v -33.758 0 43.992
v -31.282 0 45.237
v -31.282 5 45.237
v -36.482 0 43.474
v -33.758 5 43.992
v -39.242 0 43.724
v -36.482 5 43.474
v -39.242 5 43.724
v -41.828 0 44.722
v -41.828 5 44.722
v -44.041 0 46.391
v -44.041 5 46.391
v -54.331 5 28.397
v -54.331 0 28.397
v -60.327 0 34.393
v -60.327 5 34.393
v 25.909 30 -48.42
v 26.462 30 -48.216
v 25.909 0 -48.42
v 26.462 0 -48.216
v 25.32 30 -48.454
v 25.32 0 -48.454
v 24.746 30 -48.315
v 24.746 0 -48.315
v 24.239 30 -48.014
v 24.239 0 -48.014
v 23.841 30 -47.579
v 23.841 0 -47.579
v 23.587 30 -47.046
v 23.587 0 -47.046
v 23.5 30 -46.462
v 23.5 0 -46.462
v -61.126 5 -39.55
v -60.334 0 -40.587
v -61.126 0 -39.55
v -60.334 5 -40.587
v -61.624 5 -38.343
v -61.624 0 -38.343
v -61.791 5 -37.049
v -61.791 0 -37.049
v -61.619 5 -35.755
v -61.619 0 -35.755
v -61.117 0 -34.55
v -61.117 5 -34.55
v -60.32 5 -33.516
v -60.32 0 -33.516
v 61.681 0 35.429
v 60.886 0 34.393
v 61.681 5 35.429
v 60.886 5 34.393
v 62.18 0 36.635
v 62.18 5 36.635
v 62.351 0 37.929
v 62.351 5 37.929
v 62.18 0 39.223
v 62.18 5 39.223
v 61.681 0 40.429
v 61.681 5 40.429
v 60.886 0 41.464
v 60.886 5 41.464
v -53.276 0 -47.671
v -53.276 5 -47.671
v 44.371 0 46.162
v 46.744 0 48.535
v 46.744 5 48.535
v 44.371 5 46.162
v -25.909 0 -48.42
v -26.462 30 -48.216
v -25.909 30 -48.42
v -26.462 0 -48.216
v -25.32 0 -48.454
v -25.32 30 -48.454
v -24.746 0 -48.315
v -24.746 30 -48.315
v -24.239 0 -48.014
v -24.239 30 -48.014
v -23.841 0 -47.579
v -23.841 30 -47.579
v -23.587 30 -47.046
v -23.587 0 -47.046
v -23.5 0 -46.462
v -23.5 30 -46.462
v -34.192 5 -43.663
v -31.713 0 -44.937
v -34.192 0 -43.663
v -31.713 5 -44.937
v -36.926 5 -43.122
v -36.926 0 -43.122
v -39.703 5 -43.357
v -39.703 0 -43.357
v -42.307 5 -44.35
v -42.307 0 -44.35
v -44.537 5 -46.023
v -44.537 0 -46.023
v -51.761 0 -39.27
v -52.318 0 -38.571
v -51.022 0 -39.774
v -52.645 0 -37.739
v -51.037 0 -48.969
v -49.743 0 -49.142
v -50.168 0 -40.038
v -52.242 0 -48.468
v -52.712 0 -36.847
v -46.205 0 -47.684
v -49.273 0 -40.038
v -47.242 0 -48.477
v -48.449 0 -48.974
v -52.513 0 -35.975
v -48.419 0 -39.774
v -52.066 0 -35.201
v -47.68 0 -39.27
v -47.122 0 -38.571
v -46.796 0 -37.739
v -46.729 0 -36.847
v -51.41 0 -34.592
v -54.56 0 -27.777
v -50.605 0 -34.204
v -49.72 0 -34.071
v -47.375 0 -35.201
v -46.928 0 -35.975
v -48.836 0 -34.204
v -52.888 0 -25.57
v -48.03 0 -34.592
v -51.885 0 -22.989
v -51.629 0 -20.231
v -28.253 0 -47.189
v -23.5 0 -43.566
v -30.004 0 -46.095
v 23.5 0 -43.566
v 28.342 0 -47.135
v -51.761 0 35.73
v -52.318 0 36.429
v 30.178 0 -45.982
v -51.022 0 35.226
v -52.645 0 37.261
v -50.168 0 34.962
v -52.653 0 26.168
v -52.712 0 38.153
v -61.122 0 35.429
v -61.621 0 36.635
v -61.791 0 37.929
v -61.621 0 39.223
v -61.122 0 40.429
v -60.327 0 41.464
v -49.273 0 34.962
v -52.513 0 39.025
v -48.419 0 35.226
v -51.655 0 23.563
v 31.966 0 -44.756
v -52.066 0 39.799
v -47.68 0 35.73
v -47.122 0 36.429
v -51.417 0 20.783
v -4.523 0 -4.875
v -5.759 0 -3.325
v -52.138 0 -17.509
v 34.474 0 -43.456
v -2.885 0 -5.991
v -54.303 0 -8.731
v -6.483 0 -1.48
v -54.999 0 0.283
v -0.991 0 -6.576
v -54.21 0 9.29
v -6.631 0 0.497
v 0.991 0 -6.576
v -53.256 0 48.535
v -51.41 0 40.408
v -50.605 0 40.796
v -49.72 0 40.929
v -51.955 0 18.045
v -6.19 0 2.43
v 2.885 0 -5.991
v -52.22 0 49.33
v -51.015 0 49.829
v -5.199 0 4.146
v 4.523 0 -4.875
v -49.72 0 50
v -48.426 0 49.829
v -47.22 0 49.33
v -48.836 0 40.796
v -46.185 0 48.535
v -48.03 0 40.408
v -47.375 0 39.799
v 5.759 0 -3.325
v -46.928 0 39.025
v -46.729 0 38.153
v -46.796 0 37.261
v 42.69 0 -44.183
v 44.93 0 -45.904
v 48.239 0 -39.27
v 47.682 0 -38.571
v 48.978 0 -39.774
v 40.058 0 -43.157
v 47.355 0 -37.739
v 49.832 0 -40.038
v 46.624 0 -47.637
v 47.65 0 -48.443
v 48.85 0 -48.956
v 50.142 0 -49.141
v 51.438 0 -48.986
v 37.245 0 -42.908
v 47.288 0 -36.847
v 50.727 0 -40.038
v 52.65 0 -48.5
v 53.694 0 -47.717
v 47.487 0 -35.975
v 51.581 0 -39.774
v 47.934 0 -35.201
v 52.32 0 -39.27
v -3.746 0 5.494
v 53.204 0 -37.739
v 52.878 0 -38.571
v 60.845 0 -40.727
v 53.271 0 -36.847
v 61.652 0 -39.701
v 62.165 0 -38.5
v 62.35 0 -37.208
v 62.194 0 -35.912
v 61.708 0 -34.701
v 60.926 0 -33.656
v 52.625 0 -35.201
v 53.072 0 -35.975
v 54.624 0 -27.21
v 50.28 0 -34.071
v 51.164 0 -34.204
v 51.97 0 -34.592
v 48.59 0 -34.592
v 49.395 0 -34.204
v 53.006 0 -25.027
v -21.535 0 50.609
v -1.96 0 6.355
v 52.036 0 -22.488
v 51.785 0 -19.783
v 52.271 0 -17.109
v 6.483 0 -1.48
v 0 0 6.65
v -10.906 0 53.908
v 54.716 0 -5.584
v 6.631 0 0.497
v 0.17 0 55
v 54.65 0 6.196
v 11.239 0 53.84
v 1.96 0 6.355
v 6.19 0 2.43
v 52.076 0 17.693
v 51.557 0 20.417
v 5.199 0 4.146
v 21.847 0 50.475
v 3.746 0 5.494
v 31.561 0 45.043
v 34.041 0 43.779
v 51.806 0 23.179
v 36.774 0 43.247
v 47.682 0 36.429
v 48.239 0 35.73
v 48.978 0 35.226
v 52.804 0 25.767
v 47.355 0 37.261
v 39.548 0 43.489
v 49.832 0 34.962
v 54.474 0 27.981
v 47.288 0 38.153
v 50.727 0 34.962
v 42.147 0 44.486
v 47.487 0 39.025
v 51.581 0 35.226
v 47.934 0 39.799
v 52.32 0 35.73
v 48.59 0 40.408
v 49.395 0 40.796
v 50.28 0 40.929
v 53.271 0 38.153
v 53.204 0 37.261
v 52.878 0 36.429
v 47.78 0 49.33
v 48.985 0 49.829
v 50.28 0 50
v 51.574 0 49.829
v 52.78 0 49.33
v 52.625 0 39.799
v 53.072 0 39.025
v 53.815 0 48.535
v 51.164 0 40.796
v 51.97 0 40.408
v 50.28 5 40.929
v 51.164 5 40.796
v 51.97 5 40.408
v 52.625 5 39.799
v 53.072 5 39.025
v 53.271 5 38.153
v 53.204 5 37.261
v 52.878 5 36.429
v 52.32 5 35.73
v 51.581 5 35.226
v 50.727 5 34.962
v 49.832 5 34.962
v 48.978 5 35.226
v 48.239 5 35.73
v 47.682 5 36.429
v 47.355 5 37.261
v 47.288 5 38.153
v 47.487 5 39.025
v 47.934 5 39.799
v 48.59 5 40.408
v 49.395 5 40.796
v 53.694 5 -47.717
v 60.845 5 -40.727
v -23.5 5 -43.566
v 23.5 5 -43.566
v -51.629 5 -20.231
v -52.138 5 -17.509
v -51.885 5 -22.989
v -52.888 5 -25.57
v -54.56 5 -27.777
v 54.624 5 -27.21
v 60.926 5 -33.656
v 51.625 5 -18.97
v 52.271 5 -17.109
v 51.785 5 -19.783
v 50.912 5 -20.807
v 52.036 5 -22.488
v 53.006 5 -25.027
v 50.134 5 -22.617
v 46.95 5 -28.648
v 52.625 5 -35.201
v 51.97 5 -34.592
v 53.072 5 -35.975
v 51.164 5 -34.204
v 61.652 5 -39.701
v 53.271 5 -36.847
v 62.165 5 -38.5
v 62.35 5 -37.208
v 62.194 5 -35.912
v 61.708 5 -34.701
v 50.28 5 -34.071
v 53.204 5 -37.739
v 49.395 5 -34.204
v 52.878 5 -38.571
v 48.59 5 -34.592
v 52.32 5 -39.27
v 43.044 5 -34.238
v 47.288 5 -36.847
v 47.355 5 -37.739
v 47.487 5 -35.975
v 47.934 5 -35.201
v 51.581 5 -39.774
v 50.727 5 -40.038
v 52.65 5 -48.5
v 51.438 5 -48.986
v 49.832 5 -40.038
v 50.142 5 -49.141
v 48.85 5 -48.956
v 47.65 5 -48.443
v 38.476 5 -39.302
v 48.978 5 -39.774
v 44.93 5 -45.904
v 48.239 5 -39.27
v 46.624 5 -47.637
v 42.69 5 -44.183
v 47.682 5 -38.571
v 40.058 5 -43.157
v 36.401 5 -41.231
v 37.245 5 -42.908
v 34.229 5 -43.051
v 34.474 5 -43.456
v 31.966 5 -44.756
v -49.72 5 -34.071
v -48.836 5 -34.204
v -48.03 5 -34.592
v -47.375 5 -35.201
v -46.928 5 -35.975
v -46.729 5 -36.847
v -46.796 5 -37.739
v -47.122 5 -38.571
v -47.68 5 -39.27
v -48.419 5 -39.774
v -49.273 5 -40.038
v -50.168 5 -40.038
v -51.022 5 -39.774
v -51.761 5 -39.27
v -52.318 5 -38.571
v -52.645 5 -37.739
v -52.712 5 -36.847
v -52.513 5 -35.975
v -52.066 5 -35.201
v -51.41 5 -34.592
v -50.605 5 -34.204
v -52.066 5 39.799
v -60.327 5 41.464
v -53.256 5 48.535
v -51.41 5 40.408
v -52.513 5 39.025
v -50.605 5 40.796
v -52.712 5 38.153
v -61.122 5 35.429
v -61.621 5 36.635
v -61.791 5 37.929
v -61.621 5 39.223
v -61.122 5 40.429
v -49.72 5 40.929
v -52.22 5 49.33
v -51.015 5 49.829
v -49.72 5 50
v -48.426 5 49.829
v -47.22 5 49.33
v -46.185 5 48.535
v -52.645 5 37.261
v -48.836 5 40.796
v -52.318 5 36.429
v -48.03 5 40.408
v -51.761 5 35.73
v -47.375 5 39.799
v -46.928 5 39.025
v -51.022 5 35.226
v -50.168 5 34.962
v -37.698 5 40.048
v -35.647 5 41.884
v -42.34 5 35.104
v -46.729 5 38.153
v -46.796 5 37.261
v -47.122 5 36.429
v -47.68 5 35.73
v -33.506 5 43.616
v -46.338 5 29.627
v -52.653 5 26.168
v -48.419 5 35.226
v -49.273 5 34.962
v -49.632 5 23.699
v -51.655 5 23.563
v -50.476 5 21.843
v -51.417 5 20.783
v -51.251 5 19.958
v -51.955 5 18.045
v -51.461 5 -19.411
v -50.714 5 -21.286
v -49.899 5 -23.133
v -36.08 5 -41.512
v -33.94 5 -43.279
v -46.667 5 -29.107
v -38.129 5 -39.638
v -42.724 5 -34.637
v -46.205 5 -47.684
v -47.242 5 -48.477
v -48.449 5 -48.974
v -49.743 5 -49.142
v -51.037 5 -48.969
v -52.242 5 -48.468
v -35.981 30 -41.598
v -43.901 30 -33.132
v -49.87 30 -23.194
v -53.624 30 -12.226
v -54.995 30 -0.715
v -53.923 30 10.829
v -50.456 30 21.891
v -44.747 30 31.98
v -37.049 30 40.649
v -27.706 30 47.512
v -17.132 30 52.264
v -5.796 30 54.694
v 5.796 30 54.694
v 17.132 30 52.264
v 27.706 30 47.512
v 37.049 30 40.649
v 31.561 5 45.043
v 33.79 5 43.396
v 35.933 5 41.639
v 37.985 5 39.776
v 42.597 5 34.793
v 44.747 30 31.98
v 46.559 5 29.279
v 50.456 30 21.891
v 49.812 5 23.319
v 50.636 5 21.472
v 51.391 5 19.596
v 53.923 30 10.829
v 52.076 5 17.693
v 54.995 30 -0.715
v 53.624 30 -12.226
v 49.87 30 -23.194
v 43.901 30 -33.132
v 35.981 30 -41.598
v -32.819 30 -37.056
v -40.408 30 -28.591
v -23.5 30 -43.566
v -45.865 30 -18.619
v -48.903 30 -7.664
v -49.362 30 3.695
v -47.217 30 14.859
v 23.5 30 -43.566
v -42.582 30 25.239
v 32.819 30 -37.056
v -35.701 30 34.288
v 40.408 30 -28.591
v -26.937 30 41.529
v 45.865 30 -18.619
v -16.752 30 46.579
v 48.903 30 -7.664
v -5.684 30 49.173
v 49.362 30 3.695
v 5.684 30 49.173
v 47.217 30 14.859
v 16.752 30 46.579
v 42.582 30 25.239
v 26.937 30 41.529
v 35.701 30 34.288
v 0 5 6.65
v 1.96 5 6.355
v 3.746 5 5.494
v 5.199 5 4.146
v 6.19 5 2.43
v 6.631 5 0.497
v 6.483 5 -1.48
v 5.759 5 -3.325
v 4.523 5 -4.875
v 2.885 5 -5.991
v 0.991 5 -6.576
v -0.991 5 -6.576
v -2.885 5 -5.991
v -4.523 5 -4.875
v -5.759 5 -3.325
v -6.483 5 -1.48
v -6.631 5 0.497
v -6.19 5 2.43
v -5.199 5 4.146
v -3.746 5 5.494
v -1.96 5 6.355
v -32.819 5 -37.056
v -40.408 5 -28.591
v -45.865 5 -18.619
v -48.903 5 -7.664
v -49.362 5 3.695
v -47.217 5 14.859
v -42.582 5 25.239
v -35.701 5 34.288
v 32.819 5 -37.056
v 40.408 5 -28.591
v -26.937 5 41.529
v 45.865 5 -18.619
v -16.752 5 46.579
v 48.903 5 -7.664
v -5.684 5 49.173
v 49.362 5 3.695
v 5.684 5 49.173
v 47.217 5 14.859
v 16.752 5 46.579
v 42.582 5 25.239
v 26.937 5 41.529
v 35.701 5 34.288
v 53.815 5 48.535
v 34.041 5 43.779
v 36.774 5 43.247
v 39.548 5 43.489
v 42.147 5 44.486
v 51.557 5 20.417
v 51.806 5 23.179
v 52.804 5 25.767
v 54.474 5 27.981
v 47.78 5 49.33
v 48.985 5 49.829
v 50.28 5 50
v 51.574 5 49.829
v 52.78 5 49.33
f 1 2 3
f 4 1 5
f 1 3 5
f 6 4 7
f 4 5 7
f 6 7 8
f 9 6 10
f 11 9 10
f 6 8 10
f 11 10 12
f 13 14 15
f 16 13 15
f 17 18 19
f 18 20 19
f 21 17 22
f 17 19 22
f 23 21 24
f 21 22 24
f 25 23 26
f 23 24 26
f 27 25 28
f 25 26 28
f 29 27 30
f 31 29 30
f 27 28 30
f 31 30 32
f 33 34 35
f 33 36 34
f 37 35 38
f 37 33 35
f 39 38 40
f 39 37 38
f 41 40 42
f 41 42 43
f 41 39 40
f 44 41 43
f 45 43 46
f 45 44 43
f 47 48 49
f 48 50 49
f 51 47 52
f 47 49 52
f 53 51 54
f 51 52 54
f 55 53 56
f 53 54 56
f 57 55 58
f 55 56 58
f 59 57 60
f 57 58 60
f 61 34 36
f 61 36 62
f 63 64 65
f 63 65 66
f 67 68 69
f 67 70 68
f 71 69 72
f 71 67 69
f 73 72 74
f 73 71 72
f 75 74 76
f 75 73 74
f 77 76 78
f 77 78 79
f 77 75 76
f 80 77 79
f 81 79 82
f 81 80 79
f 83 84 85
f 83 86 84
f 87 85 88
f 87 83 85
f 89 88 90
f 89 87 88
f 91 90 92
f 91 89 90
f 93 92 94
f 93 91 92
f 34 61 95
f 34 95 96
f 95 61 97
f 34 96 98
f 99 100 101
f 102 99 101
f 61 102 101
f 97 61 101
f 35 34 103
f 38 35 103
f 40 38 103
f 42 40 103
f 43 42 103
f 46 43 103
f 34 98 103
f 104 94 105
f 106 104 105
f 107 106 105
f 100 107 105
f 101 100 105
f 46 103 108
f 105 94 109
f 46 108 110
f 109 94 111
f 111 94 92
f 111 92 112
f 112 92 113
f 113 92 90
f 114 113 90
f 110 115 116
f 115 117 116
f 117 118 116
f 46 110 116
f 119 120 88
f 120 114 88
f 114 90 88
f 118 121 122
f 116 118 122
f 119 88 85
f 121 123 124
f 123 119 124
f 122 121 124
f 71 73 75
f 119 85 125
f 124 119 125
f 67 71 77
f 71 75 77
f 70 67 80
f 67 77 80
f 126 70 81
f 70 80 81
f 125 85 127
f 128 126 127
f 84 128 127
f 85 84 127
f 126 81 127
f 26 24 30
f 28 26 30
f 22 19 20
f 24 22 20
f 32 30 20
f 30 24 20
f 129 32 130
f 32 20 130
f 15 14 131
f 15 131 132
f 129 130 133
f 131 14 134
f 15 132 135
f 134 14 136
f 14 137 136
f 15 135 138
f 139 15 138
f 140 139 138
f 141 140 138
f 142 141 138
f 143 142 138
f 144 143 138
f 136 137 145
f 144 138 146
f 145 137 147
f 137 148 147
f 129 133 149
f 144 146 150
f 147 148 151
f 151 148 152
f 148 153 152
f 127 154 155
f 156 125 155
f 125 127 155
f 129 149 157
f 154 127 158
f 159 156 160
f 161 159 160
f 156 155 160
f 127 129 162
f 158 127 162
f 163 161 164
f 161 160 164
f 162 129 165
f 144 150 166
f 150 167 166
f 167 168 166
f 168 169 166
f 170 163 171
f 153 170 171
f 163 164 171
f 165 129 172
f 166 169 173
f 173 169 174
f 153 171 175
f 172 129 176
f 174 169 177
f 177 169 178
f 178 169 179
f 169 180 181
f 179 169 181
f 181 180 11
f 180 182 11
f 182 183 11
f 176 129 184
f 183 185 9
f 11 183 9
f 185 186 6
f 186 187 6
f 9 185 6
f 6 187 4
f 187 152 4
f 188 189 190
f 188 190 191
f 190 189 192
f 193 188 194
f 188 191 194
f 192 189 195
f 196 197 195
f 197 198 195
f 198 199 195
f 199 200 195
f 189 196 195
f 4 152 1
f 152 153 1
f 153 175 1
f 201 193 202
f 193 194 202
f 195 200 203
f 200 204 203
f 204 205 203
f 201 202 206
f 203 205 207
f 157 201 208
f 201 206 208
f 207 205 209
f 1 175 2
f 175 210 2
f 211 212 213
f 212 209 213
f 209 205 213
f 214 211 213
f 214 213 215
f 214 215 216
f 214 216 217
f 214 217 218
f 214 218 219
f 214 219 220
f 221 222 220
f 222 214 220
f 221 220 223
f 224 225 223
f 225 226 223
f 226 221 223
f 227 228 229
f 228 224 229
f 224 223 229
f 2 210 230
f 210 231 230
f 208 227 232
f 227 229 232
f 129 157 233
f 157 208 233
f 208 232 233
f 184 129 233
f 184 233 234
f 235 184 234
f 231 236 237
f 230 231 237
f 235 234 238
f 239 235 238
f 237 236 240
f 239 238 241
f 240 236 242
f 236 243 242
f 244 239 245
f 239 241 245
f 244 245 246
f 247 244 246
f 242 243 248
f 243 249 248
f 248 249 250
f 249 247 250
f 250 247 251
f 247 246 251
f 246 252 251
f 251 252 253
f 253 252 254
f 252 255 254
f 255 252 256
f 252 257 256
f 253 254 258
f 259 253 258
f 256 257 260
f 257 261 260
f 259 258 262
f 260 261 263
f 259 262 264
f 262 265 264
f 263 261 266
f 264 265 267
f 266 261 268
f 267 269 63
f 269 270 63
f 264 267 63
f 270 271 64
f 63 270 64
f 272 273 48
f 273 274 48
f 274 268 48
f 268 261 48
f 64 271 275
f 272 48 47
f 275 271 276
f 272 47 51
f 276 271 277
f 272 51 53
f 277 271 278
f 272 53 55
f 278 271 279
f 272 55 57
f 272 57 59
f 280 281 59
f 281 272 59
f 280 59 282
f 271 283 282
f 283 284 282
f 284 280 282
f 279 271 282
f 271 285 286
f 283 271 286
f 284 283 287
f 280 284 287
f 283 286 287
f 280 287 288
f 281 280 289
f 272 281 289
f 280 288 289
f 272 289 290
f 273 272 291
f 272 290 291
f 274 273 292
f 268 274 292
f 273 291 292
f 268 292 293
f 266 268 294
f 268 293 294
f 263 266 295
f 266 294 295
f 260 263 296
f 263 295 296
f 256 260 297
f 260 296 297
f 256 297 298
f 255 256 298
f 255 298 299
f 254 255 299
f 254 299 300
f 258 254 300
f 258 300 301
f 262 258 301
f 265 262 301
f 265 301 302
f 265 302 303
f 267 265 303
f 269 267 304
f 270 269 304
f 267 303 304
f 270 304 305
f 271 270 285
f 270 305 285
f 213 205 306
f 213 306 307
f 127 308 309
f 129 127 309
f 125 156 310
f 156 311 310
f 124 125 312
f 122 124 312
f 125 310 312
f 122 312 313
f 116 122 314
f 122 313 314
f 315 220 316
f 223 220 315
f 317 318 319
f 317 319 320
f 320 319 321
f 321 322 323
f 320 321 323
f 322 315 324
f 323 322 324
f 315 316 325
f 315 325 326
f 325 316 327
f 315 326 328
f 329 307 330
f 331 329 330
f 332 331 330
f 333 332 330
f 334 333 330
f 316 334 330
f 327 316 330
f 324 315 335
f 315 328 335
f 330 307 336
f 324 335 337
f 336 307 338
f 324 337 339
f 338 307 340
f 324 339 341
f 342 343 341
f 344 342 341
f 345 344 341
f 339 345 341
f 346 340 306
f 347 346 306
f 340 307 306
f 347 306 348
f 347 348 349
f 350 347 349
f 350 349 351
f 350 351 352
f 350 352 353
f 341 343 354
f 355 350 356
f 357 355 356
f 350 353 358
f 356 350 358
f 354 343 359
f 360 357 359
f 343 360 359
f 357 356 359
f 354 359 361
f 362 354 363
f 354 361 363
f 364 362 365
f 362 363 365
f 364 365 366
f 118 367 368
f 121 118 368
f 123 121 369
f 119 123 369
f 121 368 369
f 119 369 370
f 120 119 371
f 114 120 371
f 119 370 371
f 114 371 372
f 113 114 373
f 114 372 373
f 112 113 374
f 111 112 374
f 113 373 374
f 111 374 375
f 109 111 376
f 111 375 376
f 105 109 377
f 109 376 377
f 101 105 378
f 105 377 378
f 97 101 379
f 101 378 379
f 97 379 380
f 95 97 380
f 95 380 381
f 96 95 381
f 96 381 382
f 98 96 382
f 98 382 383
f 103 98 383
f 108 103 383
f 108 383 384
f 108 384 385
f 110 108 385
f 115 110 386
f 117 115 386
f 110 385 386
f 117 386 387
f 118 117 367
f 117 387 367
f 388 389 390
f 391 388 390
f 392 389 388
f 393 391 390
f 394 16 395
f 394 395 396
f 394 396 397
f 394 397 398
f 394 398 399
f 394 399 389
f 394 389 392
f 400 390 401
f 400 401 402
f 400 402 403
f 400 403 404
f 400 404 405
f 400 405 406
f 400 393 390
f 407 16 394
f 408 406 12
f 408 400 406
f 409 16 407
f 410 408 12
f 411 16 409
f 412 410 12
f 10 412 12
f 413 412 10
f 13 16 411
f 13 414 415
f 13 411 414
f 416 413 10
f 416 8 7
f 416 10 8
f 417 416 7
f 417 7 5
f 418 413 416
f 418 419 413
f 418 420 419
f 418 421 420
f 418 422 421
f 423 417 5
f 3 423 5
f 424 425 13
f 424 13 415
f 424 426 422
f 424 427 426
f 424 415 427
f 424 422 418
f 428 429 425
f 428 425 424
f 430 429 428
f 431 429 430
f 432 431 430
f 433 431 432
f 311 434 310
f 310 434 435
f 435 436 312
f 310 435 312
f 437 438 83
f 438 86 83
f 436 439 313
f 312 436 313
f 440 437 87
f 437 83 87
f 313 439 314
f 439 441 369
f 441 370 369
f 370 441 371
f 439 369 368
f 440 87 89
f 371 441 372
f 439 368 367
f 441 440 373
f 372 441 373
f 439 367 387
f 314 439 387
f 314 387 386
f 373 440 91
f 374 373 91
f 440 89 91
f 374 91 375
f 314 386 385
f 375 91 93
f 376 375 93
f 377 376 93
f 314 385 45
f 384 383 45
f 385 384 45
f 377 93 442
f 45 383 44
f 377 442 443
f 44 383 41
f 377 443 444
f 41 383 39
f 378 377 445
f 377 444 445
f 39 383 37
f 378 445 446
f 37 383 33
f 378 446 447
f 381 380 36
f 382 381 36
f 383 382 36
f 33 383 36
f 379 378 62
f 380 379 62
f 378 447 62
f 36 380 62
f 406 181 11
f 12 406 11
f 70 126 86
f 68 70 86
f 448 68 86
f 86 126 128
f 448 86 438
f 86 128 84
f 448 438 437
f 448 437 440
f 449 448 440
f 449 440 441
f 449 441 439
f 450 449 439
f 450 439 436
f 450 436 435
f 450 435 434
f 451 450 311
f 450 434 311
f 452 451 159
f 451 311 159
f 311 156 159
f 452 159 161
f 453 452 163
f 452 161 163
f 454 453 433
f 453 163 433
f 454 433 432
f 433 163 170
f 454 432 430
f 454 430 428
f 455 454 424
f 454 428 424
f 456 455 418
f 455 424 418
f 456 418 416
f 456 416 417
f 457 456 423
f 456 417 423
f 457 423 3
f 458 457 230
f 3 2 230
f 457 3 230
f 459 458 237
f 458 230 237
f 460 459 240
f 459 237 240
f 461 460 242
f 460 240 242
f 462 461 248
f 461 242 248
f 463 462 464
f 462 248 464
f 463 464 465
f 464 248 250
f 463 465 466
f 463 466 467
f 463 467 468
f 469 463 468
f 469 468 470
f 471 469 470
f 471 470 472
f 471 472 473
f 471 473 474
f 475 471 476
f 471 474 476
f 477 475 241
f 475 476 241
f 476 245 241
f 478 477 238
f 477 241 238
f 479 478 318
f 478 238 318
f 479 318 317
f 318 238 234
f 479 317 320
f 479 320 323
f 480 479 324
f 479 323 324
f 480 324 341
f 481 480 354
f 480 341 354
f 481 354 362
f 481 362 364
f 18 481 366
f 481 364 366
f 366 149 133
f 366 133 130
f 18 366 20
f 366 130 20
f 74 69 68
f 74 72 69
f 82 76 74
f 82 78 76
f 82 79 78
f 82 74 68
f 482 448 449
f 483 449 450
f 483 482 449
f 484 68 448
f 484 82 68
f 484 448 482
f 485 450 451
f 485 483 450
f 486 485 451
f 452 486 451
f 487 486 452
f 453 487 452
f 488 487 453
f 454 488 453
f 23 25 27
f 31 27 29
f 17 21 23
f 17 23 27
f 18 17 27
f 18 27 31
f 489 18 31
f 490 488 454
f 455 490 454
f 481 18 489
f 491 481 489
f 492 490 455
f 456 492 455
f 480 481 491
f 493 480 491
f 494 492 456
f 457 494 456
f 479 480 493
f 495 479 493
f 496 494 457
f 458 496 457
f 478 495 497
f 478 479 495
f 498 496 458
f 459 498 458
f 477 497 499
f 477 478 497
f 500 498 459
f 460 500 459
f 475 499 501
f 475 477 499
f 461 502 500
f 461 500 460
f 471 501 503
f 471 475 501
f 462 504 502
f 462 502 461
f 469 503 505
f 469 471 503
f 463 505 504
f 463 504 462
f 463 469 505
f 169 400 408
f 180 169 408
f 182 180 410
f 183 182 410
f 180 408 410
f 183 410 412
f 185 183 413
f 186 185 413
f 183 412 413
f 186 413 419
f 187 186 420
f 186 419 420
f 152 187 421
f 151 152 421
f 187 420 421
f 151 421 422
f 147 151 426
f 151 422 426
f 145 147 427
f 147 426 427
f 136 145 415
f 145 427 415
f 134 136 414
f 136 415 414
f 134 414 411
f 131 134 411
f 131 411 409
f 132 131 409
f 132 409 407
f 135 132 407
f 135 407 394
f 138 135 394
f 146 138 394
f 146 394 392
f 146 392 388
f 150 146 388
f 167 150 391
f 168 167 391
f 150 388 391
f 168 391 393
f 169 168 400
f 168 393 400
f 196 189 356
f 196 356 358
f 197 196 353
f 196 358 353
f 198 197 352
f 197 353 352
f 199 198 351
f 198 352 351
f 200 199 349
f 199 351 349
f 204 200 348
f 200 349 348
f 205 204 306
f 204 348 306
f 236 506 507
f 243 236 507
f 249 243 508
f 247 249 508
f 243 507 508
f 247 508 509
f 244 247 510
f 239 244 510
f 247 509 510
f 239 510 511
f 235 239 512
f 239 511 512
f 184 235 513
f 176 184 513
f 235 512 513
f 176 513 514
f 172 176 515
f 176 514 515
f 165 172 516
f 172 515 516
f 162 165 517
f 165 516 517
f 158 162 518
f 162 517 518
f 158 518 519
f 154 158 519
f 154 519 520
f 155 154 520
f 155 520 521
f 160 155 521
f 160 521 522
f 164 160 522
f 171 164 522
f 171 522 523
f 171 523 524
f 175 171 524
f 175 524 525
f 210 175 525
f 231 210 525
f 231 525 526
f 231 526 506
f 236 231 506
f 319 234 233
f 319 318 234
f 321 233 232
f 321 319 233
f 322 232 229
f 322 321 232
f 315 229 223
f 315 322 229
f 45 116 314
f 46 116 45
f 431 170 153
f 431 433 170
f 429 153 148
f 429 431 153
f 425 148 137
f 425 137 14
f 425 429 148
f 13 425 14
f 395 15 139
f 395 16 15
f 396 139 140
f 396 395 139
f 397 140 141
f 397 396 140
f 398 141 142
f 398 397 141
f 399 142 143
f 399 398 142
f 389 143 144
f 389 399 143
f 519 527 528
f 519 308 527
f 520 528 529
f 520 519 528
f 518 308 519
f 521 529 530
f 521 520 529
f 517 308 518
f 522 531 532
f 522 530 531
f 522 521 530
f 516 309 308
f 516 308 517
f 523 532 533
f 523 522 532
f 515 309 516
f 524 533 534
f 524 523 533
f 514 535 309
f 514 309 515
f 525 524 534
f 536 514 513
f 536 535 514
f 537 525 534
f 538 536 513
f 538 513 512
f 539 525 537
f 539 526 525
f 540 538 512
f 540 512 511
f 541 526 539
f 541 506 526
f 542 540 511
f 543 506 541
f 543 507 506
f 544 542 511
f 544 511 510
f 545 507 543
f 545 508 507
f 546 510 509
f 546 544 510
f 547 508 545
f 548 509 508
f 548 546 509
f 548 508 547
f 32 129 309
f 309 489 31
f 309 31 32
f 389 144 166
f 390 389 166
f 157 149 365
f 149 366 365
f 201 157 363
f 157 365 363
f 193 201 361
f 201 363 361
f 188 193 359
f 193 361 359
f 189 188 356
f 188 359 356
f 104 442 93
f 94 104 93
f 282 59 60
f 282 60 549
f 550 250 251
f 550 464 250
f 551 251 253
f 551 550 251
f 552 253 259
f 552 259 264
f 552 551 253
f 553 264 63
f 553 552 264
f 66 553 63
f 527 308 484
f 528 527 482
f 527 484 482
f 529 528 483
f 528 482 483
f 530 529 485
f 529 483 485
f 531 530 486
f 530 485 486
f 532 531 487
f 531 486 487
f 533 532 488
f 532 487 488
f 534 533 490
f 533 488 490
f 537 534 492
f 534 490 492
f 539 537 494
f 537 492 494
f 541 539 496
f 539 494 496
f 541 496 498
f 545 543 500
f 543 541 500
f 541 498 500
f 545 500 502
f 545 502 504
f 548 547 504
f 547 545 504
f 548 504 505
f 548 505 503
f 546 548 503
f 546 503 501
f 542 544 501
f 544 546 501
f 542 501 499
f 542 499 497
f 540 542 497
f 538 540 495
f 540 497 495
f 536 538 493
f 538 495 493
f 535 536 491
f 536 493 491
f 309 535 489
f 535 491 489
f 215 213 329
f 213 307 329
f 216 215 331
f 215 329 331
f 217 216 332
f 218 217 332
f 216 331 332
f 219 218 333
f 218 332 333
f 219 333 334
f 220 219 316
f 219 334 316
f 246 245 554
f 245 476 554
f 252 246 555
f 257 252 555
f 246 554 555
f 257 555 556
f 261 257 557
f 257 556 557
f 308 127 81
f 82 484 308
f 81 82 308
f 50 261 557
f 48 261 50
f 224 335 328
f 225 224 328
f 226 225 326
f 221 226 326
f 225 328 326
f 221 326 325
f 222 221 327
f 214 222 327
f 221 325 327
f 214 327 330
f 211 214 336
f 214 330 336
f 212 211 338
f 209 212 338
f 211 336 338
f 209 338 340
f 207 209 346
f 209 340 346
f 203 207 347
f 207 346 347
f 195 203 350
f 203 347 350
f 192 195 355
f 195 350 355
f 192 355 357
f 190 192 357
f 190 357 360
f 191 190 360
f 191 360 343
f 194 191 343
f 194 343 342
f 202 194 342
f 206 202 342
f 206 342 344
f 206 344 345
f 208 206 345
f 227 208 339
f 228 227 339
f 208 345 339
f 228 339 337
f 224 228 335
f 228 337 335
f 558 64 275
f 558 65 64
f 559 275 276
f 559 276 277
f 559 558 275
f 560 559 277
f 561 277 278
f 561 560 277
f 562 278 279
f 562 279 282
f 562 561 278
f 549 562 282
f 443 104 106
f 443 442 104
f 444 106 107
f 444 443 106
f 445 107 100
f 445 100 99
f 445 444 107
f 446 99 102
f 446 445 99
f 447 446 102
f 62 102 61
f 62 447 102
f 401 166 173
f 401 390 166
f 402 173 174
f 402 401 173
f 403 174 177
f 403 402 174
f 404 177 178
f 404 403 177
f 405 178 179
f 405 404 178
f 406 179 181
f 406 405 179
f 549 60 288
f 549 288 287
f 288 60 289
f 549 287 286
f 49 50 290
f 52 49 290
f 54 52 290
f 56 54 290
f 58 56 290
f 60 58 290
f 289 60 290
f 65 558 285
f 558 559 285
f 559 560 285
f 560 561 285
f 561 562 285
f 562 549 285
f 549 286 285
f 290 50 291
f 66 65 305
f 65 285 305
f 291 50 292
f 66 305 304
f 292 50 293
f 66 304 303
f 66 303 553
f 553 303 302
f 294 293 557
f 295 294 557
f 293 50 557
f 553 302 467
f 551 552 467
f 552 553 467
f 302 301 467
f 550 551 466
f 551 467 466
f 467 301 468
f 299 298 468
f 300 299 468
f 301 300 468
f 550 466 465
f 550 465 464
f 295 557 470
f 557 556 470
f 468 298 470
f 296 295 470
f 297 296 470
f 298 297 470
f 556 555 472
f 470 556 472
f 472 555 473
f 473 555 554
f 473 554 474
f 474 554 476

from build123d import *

# Parameters (mm, degrees)
SKETCH_1_R          = 55
EXTRUDE_1_DEPTH     = 30
SKETCH_3_R          = 49.5
CUT_EXTRUDE_1_DEPTH = 25
SKETCH_5_W          = 47
SKETCH_5_H          = 12.24289715
CUT_EXTRUDE_2_DEPTH = 30
FILLET_4_R          = 2
FILLET_5_R          = 2
SKETCH_6_R          = 6.65
CUT_EXTRUDE_3_DEPTH = 12
EXTRUDE_START       = -5
EXTRUDE_3_DEPTH     = 5
FILLET_7_R          = 10
FILLET_8_R          = 5
SKETCH_10_R         = 3
CUT_EXTRUDE_5_DEPTH = 5


with BuildPart() as part:
    # 草图1 → 凸台-拉伸1 (new body)
    with BuildSketch(Plane(origin=(0, 0, 0), x_dir=(1, 0, 0), z_dir=(0, 1, 0))):
        with Locations(Location((0, 0, 0), (0, 0, 270))):
            Circle(SKETCH_1_R)
    extrude(amount=EXTRUDE_1_DEPTH)

    # 草图3 → 切除-拉伸1 (cut)
    with BuildSketch(Plane(origin=(0, 30, 0), x_dir=(1, 0, 0), z_dir=(0, 1, 0))):
        with Locations(Location((0, 0, 0), (0, 0, 270))):
            Circle(SKETCH_3_R)
    extrude(amount=-CUT_EXTRUDE_1_DEPTH, mode=Mode.SUBTRACT)

    # 草图5 → 切除-拉伸2 (cut)
    with BuildSketch(Plane(origin=(0, 30, 0), x_dir=(1, 0, 0), z_dir=(0, 1, 0))):
        with Locations((0, 49.687490397)):
            Rectangle(SKETCH_5_W, SKETCH_5_H)
    extrude(amount=-CUT_EXTRUDE_2_DEPTH, mode=Mode.SUBTRACT)

    # 圆角4
    fillet_4_edges = [part.edges().sort_by_distance(p)[0] for p in [
        (-23.5, 15, -49.726753363),
    ]]
    fillet(fillet_4_edges, radius=FILLET_4_R)

    # 圆角5
    fillet_5_edges = [part.edges().sort_by_distance(p)[0] for p in [
        (23.5, 15, -49.726753363),
    ]]
    fillet(fillet_5_edges, radius=FILLET_5_R)

    # 草图6 → 切除-拉伸3 (cut)
    with BuildSketch(Plane(origin=(0, 5, 0), x_dir=(1, 0, 0), z_dir=(0, 1, 0))):
        with Locations(Location((0, 0, 0), (0, 0, 270))):
            Circle(SKETCH_6_R)
    extrude(amount=-CUT_EXTRUDE_3_DEPTH, mode=Mode.SUBTRACT)

    # 草图14 → 凸台-拉伸3 (add)
    with BuildSketch(Plane(origin=(0, 5, 0), x_dir=(1, 0, 0), z_dir=(0, 1, 0)).offset(EXTRUDE_START)):
        with BuildLine():
            Line((-49.898576095, 23.132922507), (-63.862525635, 37.044772973))
            Line((-63.862525635, 37.044772973), (-49.746845912, 51.213315099))
            Line((-49.746845912, 51.213315099), (-38.128637352, 39.638453724))
            ThreePointArc((-38.128637352, 39.638453724), (-44.78063998, 31.932652301), (-49.898576095, 23.132922507))
        make_face()
        with BuildLine():
            Line((49.811900188, -23.3189751), (64.421720913, -37.928795825))
            Line((64.421720913, -37.928795825), (50.279585289, -52.070931449))
            Line((50.279585289, -52.070931449), (37.984884655, -39.776230814))
            ThreePointArc((37.984884655, -39.776230814), (44.662950793, -32.097053236), (49.811900188, -23.3189751))
        make_face()
        with BuildLine():
            Line((-49.632393674, -23.698639164), (-63.862550335, -37.928795825))
            Line((-63.862550335, -37.928795825), (-49.720414711, -52.070931449))
            Line((-49.720414711, -52.070931449), (-37.697852746, -40.048369484))
            ThreePointArc((-37.697852746, -40.048369484), (-44.423770724, -32.427281642), (-49.632393674, -23.698639164))
        make_face()
        with BuildLine():
            Line((38.475737251, 39.301623923), (50.118901666, 51.212426922))
            Line((50.118901666, 51.212426922), (64.420808036, 37.231887798))
            Line((64.420808036, 37.231887798), (50.134465219, 22.6171483))
            ThreePointArc((50.134465219, 22.6171483), (45.083643676, 31.50341367), (38.475737251, 39.301623923))
        make_face()
    extrude(amount=EXTRUDE_3_DEPTH)

    # 圆角7
    fillet_7_edges = [part.edges().sort_by_distance(p)[0] for p in [
        (-38.128637352, 2.5, -39.638453724),
        (-49.898576095, 2.5, -23.132922507),
        (-49.632393674, 2.5, 23.698639164),
        (-37.697852746, 2.5, 40.048369484),
        (50.134465219, 2.5, -22.6171483),
        (38.475737251, 2.5, -39.301623923),
        (37.984884655, 2.5, 39.776230814),
        (49.811900188, 2.5, 23.3189751),
    ]]
    fillet(fillet_7_edges, radius=FILLET_7_R)

    # 圆角8
    fillet_8_edges = [part.edges().sort_by_distance(p)[0] for p in [
        (-63.862525635, 2.5, -37.044772973),
        (-49.746845912, 2.5, -51.213315099),
        (-49.720414711, 2.5, 52.070931449),
        (-63.862550335, 2.5, 37.928795825),
        (50.118901666, 2.5, -51.212426922),
        (64.420808036, 2.5, -37.231887798),
        (50.279585289, 2.5, 52.070931449),
        (64.421720913, 2.5, 37.928795825),
    ]]
    fillet(fillet_8_edges, radius=FILLET_8_R)

    # 草图10 → 切除-拉伸5 (cut)
    with BuildSketch(Plane(origin=(0, 5, 0), x_dir=(1, 0, 0), z_dir=(0, 1, 0))):
        with Locations(Location((-49.720414711, 37.071204175, 0), (0, 0, 270))):
            Circle(SKETCH_10_R)
        with Locations(Location((50.279585289, 37.071204175, 0), (0, 0, 270))):
            Circle(SKETCH_10_R)
        with Locations(Location((-49.720414711, -37.928795825, 0), (0, 0, 270))):
            Circle(SKETCH_10_R)
        with Locations(Location((50.279585289, -37.928795825, 0), (0, 0, 270))):
            Circle(SKETCH_10_R)
    extrude(amount=-CUT_EXTRUDE_5_DEPTH, mode=Mode.SUBTRACT)


solid = part.part
